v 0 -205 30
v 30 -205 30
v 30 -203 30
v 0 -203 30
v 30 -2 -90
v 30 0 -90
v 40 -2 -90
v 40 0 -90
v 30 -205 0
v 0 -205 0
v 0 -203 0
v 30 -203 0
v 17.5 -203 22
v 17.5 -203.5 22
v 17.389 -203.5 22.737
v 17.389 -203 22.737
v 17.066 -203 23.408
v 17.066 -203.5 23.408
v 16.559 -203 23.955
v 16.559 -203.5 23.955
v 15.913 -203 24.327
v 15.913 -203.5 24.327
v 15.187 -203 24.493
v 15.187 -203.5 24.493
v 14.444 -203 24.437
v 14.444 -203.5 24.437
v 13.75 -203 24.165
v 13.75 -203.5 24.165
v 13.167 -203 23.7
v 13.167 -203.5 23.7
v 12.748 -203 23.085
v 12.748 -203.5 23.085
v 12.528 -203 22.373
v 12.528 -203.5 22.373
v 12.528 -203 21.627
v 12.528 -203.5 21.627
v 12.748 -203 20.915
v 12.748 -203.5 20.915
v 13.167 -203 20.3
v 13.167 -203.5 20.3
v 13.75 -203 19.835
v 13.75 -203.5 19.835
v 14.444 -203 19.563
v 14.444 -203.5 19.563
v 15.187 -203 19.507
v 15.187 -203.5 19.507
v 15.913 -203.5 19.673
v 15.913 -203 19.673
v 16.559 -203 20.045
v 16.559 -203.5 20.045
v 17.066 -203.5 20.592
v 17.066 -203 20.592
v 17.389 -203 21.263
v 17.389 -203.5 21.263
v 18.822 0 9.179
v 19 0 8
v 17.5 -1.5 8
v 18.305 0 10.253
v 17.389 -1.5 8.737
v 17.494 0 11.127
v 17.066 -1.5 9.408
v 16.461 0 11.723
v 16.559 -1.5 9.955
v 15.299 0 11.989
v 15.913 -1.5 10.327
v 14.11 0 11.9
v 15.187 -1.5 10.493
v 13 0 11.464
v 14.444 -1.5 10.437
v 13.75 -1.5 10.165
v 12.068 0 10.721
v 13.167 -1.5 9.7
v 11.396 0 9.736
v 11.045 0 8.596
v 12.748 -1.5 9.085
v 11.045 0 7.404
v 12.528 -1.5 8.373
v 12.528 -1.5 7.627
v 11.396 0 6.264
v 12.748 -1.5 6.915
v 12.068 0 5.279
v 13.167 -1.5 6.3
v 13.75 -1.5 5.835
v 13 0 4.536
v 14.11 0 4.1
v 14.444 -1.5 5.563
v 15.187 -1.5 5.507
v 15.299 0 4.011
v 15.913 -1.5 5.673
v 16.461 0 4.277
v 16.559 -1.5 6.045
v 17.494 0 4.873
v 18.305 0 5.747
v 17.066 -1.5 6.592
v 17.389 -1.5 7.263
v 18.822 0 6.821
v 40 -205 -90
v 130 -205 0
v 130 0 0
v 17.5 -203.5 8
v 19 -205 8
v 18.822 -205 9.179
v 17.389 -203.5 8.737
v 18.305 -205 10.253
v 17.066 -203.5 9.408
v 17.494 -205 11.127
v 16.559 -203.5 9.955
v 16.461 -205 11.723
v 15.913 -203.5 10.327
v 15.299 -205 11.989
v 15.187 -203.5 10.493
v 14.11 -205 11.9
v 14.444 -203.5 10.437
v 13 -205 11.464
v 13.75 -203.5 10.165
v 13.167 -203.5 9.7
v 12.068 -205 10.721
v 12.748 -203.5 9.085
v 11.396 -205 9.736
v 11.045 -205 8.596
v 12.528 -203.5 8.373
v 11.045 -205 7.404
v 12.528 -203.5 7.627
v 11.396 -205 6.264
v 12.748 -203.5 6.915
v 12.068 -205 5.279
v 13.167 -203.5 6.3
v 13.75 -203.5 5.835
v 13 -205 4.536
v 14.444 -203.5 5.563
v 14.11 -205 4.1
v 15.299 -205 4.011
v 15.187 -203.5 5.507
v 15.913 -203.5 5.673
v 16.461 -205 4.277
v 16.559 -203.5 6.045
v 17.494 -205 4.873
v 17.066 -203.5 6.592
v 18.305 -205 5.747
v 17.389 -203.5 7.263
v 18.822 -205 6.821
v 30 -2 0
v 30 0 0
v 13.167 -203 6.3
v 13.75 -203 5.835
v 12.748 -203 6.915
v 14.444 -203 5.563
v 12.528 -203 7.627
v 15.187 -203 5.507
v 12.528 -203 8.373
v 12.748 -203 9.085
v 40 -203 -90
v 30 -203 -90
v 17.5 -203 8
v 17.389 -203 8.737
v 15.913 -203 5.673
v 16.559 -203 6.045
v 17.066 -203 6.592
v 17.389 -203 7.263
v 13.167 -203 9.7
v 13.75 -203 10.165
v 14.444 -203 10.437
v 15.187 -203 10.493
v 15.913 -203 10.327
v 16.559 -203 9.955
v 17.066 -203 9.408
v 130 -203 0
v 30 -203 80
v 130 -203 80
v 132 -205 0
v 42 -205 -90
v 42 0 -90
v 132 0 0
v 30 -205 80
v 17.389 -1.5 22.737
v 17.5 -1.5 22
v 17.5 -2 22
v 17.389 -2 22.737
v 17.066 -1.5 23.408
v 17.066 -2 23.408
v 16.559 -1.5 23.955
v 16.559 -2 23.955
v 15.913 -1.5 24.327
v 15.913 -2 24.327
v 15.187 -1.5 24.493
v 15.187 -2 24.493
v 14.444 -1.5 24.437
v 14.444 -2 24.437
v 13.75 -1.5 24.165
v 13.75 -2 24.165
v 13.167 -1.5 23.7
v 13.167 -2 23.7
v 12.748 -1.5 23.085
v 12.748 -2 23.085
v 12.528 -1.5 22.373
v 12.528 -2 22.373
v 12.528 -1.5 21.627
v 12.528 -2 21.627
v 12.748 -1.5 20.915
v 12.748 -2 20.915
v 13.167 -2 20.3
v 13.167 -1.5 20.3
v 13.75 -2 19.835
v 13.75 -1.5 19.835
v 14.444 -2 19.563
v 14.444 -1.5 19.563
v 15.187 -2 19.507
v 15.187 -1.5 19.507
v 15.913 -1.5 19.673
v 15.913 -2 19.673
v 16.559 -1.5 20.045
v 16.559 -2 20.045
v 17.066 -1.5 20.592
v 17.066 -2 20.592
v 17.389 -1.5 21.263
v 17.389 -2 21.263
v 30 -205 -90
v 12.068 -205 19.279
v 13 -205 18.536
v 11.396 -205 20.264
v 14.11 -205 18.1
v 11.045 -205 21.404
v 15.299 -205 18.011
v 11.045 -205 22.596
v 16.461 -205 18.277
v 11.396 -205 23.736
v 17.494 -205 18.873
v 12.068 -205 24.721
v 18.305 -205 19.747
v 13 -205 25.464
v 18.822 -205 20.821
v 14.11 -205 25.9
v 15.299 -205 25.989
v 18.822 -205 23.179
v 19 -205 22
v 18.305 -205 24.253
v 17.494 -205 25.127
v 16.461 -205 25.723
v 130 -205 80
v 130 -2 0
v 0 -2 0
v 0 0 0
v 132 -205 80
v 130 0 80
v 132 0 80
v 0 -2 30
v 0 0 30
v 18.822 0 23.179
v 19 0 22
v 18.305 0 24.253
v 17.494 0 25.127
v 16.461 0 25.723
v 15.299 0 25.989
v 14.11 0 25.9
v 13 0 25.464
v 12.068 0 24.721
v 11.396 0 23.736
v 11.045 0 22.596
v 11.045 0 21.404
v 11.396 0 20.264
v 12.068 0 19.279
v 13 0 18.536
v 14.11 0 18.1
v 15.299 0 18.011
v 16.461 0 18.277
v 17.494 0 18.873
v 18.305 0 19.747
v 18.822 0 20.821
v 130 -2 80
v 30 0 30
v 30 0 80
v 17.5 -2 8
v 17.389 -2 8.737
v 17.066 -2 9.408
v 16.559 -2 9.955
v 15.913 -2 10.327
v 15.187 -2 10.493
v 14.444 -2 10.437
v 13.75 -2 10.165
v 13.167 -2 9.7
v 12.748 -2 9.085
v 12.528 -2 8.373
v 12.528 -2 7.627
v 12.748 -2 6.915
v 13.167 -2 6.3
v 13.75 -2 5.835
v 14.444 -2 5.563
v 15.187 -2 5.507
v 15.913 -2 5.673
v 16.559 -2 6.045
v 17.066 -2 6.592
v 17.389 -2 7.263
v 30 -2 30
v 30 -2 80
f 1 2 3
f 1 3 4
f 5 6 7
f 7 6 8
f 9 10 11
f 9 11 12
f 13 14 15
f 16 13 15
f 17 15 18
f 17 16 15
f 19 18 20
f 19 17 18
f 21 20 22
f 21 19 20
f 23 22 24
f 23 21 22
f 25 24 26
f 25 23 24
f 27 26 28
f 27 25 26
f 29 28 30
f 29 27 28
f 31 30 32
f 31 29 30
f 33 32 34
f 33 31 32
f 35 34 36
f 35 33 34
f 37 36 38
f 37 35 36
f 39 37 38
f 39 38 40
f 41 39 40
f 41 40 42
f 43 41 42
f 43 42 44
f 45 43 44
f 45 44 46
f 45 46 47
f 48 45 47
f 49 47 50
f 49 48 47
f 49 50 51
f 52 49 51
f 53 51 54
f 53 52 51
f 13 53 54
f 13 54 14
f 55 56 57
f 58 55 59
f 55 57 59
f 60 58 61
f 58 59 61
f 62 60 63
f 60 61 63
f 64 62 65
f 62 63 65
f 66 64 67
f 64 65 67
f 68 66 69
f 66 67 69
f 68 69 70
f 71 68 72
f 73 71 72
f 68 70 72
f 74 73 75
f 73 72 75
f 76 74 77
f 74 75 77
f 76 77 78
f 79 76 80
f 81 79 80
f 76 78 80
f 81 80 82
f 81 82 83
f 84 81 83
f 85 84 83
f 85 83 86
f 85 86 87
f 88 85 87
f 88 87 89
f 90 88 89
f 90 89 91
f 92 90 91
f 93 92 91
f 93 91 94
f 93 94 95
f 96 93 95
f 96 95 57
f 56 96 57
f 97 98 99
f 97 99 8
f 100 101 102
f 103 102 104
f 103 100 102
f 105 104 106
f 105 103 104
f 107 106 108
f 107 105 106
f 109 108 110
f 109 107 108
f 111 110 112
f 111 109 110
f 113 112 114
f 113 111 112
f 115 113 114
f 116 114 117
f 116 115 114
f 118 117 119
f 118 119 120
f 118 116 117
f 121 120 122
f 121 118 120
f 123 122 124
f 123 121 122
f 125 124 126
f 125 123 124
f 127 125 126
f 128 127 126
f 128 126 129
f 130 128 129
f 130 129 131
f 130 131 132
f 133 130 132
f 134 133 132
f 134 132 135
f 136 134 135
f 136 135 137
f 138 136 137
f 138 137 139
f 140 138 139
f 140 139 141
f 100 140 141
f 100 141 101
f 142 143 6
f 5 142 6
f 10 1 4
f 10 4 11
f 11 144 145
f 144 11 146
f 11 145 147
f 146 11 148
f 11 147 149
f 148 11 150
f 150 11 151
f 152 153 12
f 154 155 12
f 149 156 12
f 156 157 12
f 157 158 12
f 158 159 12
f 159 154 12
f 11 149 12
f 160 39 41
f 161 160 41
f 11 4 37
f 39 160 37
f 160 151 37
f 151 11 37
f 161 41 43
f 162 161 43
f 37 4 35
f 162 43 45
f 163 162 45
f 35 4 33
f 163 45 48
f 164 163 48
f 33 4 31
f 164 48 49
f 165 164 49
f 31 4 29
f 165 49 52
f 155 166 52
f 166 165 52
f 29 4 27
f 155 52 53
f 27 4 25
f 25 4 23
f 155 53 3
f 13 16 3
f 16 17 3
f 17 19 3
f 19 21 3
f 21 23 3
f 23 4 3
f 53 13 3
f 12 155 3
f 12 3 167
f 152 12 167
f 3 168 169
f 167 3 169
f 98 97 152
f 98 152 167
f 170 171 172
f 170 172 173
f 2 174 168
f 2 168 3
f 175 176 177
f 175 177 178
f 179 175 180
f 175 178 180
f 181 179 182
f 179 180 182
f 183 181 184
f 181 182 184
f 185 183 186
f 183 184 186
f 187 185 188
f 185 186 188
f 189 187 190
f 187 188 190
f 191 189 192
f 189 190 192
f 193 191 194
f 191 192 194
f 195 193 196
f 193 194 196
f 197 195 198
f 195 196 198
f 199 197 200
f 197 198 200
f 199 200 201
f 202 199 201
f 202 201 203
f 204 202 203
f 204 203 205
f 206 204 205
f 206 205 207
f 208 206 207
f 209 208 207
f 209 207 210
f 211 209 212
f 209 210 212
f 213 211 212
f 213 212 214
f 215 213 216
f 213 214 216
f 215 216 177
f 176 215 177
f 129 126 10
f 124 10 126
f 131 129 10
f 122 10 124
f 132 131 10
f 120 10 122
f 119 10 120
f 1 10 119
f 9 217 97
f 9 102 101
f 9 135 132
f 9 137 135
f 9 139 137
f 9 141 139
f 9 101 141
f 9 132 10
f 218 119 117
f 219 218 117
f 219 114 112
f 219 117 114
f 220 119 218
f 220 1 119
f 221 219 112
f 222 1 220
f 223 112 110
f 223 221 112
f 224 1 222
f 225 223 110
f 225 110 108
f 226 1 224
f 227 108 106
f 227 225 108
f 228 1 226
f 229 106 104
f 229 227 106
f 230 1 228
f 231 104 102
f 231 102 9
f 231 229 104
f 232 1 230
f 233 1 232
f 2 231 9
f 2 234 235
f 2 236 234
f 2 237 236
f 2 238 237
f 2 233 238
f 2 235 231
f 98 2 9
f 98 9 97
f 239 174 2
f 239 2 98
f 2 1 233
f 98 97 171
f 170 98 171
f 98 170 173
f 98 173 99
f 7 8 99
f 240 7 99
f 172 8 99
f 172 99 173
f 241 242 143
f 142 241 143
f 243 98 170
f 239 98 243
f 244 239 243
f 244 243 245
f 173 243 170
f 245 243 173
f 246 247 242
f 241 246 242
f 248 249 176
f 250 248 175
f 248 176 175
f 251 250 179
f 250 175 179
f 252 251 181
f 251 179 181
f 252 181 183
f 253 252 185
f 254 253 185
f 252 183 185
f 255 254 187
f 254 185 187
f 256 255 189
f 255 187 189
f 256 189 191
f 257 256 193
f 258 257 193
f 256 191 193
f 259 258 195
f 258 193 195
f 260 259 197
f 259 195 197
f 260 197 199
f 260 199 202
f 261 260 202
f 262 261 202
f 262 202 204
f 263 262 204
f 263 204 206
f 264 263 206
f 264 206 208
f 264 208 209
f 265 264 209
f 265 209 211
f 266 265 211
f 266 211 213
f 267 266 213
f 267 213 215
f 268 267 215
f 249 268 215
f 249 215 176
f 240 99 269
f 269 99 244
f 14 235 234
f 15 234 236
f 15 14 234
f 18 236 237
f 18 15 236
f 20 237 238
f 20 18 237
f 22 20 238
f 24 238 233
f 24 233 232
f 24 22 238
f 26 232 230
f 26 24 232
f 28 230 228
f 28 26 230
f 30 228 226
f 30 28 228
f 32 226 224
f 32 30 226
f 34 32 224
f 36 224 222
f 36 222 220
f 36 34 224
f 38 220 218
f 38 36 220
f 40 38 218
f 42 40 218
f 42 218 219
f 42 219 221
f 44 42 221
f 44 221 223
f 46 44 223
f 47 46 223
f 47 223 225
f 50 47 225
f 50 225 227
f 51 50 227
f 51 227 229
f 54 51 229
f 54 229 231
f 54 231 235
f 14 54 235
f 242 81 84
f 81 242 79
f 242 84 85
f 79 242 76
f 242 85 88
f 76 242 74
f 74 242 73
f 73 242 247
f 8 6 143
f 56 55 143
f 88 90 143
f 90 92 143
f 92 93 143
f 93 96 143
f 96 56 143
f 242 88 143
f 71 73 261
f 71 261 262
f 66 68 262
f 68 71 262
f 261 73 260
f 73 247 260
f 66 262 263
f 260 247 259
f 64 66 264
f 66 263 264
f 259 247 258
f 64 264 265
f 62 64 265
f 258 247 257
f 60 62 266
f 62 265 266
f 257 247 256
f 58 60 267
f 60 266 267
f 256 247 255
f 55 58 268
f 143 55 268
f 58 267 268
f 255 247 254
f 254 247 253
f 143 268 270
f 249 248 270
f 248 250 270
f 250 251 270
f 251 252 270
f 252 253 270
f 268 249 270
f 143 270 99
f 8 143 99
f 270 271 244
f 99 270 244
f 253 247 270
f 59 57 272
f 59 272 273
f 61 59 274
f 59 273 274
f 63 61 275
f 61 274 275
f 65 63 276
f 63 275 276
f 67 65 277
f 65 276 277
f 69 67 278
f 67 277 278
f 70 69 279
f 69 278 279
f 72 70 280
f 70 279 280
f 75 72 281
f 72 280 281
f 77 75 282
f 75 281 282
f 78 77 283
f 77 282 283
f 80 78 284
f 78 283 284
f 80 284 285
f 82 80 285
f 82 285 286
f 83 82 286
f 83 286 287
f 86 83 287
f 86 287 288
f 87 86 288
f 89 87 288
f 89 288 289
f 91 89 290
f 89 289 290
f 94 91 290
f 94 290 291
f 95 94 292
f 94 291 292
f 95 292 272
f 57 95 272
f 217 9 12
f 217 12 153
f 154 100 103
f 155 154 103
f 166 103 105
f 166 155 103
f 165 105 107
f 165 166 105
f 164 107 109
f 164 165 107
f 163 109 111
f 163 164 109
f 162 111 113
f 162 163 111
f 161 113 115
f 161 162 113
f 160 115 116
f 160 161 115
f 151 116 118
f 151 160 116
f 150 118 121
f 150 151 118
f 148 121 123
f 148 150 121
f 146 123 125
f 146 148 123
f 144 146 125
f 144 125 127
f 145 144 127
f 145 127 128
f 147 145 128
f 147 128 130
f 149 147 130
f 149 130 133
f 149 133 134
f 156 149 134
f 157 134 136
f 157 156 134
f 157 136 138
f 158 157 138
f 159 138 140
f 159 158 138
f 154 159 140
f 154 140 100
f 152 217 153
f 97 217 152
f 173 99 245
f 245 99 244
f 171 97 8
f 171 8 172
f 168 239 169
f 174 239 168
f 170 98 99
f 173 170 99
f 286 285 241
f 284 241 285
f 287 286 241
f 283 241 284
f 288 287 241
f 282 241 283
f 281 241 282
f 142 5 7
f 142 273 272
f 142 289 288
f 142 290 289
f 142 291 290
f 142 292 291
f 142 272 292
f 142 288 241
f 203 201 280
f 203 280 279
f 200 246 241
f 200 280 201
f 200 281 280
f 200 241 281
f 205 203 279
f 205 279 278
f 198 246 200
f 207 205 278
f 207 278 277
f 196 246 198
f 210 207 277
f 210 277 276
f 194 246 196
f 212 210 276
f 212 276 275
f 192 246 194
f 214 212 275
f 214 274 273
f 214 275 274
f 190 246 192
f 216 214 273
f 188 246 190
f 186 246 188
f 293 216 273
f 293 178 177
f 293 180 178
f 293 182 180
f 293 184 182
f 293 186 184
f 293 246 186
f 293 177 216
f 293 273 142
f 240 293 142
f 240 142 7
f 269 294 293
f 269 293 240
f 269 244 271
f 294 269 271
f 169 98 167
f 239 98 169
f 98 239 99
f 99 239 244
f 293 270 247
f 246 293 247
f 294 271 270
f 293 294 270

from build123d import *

# Parameters (mm, degrees)
F1_DEPTH       = 2
F3_D           = 5
F3_DEPTH       = 10
F3_CSINK_D     = 8
F3_CSINK_ANGLE = 90
F7_W           = 205
F7_H           = 80
F8_DEPTH       = 2
F10_DEPTH      = 205


with BuildPart() as f1:
    # F0 (on Front) → F1 (new body)
    with BuildSketch(Plane.XZ):
        Polygon((0, 30), (0, 0), (30, 0), (30, -90), (40, -90), (130, 0), (130, 80), (30, 80), (30, 30), align=None)
    extrude(amount=F1_DEPTH)

    # F3
    with Locations(Plane(origin=(0, 0, 0), x_dir=(-1, 0, 0), z_dir=(0, 1, 0))):
        with Locations((-15, 22), (-15, 8)):
            CounterSinkHole(F3_D / 2, F3_CSINK_D / 2, depth=F3_DEPTH, counter_sink_angle=F3_CSINK_ANGLE)


with BuildPart() as f5_1:
    # F5: instance of F1
    add(f1.part.mirror(Plane.XZ.offset(102.5)))


with BuildPart() as f8:
    # F7 (on offset) → F8 (new body)
    with BuildSketch(Plane.YZ.offset(130)):
        with Locations((-102.5, 40)):
            Rectangle(F7_W, F7_H)
    extrude(amount=F8_DEPTH)


with BuildPart() as f10:
    # F9 (on face) → F10 (new body)
    with BuildSketch(Plane.XZ.offset(205)):
        Polygon((132, 0), (130, 0), (40, -90), (42, -90), align=None)
    extrude(amount=-F10_DEPTH)


solid = Compound([f1.part, f5_1.part, f8.part, f10.part])
